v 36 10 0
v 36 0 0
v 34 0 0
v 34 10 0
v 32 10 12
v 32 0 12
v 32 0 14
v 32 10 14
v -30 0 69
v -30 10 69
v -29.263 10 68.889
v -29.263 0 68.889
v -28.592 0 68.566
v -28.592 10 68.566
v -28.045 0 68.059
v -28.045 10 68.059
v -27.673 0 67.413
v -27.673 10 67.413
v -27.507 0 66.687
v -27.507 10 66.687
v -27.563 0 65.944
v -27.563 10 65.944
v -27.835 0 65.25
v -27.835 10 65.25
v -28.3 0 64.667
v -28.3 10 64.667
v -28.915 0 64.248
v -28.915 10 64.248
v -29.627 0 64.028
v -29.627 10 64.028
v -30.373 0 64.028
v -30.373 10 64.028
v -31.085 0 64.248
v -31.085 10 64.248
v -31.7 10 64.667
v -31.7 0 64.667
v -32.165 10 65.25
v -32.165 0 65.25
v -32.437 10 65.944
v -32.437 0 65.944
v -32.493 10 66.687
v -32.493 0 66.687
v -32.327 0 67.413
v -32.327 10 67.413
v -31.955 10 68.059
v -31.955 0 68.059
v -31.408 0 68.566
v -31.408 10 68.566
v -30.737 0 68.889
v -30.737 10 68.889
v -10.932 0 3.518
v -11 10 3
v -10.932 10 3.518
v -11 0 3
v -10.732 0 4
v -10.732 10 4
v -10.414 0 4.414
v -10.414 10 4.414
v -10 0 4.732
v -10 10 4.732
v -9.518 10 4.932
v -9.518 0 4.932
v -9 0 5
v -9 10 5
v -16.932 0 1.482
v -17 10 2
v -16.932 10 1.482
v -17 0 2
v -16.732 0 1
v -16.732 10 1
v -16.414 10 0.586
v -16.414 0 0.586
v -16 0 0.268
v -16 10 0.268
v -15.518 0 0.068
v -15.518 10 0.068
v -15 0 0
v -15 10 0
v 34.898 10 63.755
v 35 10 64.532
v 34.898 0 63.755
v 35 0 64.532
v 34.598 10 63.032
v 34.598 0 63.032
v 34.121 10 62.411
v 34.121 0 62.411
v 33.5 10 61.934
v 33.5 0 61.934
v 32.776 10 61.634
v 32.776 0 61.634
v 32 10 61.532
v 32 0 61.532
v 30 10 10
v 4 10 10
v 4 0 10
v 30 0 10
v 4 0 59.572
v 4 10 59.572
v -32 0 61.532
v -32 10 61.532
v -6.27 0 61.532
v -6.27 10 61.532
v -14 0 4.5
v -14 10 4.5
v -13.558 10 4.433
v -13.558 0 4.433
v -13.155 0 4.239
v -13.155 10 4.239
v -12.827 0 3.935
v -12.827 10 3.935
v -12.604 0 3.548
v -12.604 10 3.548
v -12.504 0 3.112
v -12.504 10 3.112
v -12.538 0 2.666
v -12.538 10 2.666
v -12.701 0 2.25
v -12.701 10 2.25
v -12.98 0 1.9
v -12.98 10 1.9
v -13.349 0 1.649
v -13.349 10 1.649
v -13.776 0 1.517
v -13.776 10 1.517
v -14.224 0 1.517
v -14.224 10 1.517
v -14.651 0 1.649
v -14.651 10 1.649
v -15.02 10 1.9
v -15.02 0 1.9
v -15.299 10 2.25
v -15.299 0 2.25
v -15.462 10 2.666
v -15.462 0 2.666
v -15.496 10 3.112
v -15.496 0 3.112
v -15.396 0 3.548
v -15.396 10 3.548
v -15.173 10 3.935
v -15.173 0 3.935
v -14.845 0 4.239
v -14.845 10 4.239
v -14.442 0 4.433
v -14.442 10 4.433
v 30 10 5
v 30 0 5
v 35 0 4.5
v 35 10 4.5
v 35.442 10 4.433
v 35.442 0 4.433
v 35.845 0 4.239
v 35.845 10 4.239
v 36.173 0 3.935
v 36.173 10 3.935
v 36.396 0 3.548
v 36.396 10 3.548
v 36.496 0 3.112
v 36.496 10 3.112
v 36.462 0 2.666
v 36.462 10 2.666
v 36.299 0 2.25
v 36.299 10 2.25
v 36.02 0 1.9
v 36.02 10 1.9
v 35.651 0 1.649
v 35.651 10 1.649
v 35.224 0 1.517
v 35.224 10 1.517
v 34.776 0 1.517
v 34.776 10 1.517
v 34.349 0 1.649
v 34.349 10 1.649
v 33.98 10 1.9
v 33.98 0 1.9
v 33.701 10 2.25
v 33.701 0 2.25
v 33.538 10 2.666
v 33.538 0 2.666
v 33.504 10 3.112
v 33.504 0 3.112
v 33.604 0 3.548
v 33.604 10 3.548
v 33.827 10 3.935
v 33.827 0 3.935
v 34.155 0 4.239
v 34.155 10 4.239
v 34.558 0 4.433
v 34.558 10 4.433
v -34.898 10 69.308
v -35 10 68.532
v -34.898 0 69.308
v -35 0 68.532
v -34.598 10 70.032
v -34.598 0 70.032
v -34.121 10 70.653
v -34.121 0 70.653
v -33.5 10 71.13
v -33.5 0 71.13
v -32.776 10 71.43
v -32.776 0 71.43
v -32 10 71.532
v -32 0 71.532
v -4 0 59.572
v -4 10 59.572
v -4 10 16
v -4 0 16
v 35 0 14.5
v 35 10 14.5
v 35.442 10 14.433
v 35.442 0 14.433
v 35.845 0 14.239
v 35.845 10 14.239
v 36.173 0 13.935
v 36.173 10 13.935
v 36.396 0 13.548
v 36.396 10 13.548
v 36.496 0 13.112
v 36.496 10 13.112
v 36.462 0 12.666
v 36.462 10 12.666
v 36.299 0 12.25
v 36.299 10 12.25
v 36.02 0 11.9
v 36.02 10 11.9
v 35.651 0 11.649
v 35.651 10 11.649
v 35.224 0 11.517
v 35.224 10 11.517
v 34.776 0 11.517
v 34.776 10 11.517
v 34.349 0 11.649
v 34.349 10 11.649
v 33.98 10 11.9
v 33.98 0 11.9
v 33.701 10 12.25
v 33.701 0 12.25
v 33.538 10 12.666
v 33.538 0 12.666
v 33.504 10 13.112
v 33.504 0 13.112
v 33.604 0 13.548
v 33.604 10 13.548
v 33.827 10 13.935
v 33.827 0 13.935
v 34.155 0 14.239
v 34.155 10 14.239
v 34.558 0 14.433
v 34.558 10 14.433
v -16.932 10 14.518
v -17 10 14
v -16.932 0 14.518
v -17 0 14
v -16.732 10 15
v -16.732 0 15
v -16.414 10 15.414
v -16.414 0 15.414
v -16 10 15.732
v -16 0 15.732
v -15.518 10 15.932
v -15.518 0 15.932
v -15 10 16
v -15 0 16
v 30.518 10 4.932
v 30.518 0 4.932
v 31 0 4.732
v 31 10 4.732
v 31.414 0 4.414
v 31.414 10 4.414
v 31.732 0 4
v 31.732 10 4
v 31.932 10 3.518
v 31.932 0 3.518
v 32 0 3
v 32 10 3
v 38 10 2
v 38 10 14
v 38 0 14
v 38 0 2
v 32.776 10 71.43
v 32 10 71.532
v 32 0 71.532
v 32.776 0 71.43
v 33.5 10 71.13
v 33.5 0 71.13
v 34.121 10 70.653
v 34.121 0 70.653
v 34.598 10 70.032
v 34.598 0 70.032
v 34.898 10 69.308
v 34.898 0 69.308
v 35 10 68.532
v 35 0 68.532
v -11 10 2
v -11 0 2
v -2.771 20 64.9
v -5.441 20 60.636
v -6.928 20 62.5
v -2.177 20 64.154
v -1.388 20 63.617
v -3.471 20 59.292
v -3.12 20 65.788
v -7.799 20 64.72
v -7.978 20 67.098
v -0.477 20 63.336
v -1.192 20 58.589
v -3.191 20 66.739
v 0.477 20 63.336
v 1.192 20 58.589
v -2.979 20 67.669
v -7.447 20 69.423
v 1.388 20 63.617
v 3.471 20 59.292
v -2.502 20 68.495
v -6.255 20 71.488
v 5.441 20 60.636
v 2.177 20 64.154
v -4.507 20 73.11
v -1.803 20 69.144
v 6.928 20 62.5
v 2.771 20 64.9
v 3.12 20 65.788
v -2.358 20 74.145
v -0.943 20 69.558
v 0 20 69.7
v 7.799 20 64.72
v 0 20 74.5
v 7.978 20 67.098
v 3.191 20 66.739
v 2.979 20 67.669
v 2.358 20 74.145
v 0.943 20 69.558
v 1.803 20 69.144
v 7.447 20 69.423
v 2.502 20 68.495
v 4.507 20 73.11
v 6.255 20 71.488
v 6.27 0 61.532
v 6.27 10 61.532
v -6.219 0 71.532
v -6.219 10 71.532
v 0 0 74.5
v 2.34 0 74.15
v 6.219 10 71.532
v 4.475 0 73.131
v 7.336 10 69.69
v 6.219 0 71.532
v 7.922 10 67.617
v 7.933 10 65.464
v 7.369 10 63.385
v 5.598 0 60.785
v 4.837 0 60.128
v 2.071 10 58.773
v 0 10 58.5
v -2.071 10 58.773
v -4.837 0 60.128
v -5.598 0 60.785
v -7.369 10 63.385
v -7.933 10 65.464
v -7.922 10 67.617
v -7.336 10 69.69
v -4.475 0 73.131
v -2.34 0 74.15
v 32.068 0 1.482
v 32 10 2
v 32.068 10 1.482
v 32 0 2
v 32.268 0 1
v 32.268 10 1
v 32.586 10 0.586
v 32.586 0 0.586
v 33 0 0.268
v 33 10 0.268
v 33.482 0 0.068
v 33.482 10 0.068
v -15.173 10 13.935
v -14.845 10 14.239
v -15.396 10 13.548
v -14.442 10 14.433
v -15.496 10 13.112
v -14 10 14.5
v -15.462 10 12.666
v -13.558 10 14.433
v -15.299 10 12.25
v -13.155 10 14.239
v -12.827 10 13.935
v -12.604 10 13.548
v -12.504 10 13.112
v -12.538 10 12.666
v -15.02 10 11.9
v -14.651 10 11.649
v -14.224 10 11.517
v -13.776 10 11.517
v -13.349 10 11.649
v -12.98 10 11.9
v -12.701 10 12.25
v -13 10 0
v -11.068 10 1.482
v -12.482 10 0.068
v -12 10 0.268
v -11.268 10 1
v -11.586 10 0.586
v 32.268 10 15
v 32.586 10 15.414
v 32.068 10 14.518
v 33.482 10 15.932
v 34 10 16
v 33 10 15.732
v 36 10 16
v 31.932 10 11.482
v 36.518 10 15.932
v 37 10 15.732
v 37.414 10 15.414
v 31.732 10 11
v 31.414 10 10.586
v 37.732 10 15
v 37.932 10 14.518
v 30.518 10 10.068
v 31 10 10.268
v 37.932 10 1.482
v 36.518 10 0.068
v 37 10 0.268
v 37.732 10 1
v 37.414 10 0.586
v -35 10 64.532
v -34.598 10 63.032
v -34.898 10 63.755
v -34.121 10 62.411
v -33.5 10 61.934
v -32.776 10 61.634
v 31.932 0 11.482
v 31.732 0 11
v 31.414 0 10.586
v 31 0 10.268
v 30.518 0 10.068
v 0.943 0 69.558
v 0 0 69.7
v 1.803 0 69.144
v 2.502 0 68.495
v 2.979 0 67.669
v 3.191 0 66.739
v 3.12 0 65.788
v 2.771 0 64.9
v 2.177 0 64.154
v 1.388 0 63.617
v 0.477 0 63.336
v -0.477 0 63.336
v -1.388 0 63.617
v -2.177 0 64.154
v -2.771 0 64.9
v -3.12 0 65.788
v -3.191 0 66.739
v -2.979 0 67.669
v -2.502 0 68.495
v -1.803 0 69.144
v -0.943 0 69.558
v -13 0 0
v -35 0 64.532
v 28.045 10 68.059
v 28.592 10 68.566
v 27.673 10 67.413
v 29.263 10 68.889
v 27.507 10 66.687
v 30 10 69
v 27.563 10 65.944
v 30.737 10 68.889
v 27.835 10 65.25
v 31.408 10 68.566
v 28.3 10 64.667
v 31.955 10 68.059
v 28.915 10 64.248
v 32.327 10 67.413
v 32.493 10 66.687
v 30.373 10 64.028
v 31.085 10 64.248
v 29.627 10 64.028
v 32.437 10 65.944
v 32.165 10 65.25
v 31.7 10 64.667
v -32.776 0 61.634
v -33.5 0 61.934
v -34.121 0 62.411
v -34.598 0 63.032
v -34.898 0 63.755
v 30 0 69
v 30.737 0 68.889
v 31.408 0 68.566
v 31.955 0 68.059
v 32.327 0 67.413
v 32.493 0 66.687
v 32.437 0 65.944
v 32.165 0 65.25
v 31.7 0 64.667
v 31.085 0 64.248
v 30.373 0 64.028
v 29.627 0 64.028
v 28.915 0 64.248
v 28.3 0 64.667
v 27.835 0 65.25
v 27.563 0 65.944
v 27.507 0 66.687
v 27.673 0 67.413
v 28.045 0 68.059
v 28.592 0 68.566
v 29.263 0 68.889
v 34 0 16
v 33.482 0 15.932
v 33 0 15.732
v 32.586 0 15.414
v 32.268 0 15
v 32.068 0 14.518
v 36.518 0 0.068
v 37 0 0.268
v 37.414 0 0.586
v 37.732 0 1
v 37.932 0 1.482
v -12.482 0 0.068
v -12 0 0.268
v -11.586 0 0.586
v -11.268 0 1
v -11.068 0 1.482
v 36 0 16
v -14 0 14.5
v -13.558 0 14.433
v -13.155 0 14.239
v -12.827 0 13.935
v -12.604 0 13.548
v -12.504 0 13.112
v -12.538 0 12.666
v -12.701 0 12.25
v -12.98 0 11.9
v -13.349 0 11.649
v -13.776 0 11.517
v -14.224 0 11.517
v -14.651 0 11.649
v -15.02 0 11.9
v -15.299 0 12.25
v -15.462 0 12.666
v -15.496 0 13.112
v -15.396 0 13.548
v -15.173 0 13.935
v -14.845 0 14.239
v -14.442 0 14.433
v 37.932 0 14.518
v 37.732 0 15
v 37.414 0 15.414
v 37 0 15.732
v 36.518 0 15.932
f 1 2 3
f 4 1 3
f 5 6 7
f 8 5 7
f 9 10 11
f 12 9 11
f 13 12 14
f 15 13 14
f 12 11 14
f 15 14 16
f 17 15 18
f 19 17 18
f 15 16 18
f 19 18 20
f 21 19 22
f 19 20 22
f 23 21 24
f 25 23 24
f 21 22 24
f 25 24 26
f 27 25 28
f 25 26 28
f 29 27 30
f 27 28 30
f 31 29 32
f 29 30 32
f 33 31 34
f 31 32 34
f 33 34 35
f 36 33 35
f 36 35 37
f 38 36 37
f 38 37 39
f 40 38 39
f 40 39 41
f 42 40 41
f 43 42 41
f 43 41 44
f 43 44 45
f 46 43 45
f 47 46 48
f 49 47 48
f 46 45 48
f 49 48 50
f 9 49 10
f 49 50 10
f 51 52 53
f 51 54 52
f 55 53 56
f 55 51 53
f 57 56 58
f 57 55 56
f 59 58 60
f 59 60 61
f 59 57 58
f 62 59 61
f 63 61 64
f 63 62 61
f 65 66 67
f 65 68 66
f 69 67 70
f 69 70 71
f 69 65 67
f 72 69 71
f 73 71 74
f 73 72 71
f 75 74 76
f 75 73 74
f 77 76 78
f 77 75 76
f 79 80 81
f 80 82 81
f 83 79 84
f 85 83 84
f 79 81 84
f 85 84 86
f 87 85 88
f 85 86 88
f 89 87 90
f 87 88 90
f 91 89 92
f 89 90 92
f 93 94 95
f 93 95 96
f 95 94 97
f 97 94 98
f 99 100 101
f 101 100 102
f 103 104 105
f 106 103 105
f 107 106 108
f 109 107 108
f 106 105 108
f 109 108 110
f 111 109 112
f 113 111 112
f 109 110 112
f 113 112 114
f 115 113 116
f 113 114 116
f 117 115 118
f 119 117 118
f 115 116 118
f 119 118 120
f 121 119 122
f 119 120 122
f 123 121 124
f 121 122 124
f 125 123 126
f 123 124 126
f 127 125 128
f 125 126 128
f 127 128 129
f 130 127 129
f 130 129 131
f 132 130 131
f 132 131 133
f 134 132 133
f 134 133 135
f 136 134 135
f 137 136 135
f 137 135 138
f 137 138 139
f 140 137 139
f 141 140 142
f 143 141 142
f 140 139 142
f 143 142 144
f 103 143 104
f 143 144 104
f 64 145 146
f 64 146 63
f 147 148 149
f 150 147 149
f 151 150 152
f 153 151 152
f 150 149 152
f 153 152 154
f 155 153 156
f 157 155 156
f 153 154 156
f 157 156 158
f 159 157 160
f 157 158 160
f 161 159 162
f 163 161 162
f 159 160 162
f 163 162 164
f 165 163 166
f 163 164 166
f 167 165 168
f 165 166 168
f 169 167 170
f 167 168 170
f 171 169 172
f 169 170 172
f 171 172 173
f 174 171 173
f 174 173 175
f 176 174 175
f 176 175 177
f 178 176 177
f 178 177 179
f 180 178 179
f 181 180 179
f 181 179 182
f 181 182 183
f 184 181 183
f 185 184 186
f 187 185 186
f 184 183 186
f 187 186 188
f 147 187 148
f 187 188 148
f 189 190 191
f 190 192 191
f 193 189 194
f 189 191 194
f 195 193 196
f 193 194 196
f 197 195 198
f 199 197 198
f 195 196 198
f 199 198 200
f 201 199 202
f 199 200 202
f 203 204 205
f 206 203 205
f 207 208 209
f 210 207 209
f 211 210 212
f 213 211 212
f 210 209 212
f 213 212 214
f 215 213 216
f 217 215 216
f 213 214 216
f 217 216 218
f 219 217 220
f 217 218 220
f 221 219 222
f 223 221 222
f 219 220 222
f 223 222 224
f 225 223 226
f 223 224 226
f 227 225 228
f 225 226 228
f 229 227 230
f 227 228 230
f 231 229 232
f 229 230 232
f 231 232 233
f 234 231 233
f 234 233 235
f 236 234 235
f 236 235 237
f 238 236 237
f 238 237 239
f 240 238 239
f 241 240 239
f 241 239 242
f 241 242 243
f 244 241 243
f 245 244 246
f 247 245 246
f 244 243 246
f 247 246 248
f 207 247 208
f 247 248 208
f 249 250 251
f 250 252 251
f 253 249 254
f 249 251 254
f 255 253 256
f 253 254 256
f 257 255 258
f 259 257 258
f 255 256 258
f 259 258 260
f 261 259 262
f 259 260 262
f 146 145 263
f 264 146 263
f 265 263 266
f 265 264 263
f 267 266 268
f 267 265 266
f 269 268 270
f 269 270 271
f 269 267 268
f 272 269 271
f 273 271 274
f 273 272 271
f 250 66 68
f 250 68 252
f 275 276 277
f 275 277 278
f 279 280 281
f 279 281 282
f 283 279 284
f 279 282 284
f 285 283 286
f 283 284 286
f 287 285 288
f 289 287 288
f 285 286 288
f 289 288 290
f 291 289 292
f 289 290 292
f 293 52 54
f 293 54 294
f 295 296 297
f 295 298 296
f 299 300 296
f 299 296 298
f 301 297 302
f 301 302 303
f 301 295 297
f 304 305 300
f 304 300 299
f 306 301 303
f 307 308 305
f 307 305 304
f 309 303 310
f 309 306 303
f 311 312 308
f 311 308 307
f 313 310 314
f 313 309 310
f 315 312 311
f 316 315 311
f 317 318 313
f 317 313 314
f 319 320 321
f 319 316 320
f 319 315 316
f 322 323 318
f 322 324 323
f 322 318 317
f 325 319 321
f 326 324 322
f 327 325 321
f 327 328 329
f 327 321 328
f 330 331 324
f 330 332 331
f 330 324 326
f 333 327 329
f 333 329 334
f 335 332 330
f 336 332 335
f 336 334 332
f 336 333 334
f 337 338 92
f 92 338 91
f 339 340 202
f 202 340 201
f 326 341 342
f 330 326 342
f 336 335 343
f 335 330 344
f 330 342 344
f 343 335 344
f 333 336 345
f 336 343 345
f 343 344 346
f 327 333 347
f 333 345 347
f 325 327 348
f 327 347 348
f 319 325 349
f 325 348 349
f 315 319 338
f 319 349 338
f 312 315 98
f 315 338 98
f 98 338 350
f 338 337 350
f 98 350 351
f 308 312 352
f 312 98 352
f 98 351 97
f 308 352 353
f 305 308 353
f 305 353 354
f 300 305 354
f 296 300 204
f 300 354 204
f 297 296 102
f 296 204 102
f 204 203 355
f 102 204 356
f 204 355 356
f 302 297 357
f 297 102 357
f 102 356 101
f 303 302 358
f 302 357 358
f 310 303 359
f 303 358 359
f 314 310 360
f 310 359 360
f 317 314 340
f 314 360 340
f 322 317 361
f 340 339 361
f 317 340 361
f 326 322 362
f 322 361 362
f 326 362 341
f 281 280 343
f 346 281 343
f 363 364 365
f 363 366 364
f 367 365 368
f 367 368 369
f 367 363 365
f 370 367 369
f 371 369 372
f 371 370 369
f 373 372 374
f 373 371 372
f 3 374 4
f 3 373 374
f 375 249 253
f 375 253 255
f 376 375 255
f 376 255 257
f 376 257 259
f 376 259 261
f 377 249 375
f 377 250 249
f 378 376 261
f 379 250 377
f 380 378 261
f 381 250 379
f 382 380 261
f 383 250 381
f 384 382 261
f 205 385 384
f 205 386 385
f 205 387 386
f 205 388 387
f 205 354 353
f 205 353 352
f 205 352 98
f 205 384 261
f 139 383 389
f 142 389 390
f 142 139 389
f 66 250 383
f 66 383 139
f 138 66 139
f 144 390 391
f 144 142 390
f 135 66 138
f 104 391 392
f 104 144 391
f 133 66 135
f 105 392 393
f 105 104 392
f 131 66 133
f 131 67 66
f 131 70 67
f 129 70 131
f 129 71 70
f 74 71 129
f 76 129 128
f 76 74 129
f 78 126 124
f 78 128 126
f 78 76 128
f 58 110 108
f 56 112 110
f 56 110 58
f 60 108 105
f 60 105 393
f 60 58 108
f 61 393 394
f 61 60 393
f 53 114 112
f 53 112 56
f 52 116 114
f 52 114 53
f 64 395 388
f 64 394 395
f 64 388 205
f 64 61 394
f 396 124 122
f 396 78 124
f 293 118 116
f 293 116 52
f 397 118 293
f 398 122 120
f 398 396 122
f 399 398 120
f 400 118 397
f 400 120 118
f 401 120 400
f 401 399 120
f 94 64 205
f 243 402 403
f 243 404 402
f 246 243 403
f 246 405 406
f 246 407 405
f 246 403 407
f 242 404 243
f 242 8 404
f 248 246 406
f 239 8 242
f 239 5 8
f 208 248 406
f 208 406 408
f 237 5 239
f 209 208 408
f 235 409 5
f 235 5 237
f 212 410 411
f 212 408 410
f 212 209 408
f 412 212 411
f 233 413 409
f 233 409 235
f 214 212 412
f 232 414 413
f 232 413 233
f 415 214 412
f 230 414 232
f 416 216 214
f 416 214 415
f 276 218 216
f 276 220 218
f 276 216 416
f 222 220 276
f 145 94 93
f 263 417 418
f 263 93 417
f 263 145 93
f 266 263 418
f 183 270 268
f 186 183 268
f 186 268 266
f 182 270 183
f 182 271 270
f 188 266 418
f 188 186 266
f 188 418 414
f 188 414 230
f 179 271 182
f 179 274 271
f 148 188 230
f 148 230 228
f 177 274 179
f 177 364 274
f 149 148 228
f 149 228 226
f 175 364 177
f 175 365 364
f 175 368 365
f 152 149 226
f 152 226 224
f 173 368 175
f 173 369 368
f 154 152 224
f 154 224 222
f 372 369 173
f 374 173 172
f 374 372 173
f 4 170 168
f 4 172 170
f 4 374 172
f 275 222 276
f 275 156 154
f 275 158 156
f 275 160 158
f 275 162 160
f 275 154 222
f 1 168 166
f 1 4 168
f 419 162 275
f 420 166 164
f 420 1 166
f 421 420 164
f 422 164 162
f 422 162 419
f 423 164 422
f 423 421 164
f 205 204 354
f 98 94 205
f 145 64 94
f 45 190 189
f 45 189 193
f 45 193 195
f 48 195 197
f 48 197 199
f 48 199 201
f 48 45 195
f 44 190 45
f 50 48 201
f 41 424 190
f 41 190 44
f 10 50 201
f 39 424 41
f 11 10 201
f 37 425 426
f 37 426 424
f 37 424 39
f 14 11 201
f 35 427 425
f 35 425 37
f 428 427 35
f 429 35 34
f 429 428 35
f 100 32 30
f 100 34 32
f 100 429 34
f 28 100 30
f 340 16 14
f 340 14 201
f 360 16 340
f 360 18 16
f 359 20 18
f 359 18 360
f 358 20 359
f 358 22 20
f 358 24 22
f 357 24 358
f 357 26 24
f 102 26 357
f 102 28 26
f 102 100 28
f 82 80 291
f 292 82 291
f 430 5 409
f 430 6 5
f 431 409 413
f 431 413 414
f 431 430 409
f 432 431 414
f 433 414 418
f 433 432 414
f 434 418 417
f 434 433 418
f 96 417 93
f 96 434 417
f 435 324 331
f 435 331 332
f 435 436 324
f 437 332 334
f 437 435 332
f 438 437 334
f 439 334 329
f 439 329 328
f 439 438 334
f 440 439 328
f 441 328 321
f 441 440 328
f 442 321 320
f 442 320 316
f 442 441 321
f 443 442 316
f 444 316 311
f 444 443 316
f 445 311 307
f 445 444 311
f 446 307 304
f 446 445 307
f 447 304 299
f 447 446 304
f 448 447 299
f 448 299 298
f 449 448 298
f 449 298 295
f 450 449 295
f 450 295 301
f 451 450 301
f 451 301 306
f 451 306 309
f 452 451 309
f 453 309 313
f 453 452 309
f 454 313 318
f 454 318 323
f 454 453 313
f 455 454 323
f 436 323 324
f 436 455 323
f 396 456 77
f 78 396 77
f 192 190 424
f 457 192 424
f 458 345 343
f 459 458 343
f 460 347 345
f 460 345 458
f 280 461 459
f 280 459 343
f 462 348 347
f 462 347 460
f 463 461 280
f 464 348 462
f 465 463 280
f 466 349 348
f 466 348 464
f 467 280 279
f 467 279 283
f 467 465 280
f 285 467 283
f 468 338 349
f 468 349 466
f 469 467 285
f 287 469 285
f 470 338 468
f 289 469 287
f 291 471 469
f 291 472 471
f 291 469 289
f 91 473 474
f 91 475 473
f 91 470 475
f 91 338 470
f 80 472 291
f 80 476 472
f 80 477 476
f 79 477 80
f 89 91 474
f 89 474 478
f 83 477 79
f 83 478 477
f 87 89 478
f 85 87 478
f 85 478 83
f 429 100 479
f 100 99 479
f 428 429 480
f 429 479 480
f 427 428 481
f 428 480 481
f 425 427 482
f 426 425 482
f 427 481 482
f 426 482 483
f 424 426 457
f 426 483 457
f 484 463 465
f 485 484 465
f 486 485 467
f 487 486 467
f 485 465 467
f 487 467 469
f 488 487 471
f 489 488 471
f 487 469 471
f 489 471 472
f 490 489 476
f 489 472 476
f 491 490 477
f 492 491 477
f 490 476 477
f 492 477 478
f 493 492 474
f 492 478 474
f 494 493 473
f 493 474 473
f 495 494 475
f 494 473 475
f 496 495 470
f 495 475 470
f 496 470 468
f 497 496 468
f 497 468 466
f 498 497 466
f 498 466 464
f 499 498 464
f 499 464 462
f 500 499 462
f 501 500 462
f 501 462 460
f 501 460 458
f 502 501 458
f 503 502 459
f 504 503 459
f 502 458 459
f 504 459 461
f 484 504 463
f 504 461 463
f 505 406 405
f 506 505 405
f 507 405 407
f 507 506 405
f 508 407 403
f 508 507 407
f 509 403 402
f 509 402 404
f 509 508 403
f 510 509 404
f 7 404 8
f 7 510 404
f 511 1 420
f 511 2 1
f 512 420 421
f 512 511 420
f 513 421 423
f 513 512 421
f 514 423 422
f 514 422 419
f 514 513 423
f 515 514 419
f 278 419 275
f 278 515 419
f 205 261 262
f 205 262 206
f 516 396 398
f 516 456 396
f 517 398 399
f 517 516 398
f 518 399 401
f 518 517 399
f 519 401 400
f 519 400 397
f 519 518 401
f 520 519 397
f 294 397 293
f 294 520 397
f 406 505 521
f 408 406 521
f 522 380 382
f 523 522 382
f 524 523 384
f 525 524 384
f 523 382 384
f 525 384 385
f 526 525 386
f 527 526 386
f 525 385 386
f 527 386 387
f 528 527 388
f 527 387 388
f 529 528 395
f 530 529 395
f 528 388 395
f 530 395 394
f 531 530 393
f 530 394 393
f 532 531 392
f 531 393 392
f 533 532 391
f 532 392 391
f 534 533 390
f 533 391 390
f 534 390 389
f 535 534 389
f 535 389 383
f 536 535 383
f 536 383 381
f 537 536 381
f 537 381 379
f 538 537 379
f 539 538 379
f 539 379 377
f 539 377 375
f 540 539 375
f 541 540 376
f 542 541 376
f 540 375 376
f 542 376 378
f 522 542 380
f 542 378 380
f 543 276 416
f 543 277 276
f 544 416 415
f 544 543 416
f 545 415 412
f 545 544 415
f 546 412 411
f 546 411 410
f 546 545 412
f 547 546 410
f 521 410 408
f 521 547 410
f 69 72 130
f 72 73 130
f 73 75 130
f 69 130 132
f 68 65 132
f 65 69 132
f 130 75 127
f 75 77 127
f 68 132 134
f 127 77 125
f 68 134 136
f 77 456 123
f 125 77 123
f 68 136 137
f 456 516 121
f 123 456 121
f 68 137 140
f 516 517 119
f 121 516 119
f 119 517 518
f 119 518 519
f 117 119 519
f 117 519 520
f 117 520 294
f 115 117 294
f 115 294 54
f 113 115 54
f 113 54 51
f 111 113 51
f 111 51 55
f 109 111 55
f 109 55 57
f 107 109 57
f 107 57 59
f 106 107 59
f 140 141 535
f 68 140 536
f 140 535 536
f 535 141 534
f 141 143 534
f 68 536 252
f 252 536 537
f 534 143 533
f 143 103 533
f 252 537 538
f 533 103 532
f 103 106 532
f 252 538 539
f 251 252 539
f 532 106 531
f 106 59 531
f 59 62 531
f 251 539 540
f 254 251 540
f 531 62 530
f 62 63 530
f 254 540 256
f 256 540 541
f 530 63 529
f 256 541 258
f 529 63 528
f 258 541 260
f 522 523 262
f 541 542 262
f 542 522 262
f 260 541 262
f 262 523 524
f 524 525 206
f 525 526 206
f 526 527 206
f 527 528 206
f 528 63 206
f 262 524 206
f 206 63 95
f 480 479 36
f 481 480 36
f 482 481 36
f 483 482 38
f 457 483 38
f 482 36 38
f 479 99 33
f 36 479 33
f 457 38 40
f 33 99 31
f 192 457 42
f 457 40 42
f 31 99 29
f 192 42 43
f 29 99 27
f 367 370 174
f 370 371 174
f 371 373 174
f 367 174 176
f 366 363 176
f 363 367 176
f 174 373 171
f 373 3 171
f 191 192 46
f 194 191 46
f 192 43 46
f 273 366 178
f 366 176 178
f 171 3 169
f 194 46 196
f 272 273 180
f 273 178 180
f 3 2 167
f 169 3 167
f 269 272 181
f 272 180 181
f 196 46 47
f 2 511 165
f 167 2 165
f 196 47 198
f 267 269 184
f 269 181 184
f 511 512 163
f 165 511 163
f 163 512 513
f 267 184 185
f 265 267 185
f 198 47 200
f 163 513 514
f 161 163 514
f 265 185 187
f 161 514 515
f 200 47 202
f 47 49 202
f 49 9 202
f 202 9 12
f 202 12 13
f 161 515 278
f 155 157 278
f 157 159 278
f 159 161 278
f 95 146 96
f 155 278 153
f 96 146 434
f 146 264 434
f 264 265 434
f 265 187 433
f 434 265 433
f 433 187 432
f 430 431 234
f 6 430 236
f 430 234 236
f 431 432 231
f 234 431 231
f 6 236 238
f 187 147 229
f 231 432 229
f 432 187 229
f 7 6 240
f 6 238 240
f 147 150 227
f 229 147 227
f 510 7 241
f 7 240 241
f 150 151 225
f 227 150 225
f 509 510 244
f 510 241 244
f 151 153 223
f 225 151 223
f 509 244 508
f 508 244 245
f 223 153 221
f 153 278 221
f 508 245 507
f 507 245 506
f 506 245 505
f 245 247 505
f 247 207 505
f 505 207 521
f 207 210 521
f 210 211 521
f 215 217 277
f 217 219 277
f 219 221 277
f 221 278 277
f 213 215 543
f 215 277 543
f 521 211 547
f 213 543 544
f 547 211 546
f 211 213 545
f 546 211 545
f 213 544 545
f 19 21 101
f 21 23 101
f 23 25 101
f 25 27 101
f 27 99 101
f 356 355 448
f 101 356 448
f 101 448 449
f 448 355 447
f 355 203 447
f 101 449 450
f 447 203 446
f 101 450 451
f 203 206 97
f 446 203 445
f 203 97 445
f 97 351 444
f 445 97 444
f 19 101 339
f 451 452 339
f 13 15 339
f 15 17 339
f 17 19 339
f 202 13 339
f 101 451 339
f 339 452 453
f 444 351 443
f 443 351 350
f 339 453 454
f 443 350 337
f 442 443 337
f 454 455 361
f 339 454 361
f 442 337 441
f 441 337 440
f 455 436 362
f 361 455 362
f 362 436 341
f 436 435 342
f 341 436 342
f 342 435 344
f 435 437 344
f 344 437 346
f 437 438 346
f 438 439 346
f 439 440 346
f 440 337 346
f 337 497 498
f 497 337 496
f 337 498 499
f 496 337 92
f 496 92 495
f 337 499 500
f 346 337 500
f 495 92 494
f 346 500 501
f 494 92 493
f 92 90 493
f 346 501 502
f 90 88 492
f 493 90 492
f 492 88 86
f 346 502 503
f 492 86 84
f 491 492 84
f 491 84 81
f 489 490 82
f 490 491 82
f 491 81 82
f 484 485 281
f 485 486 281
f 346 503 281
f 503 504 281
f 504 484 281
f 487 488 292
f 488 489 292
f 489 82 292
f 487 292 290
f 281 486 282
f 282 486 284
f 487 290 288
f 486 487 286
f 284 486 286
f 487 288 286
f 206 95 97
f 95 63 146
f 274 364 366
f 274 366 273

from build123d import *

# Parameters (mm, degrees)
SKETCH_2_W           = 8
SKETCH_2_H           = 17
EXTRUDE_1_DEPTH      = 10
SKETCH_4_R           = 3.2
SKETCH_4_R_2         = 2.5
EXTRUDE_2_DEPTH      = 10
SKETCH_6_R           = 1.5
EXTRUDE_3_DEPTH      = 10
FILLET_6_R           = 2
FILLET_7_R           = 3
EXTRUDE_4_DEPTH      = 10
EXTRUDE_4_DEPTH_BACK = 10
SKETCH_7_R           = 8
SKETCH_7_R_2         = 3.2


with BuildPart() as part:
    # 草图2 → 凸台-拉伸1 (new body)
    with BuildSketch(Plane(origin=(0, 0, 0), x_dir=(1, 0, 0), z_dir=(0, 1, 0))):
        with Locations((0, -14.5)):
            Rectangle(SKETCH_2_W, SKETCH_2_H)
    extrude(amount=EXTRUDE_1_DEPTH)

    # 草图4 → 凸台-拉伸2 (add)
    with BuildSketch(Plane(origin=(0, 10, 0), x_dir=(1, 0, 0), z_dir=(0, 1, 0))):
        Polygon((-4, -23), (4, -23), (4, -61.531911565), (35, -61.531911565), (35, -71.531911565), (-35, -71.531911565), (-35, -61.531911565), (-4, -61.531911565), align=None)
        with Locations((0, -66.5)):
            Circle(SKETCH_4_R, mode=Mode.SUBTRACT)
        with Locations((30, -66.5)):
            Circle(SKETCH_4_R_2, mode=Mode.SUBTRACT)
        with Locations((-30, -66.5)):
            Circle(SKETCH_4_R_2, mode=Mode.SUBTRACT)
    extrude(amount=-EXTRUDE_2_DEPTH)

    # 草图6 → 凸台-拉伸3 (add)
    with BuildSketch(Plane(origin=(0, 10, 0), x_dir=(1, 0, 0), z_dir=(0, 1, 0))):
        Polygon((-17, 0), (-17, -16), (-4, -16), (-4, -10), (32, -10), (32, -16), (38, -16), (38, 0), (32, 0), (32, -5), (-11, -5), (-11, 0), align=None)
        with Locations((-14, -3)):
            Circle(SKETCH_6_R, mode=Mode.SUBTRACT)
        with Locations((-14, -13)):
            Circle(SKETCH_6_R, mode=Mode.SUBTRACT)
        with Locations((35, -3)):
            Circle(SKETCH_6_R, mode=Mode.SUBTRACT)
        with Locations((35, -13)):
            Circle(SKETCH_6_R, mode=Mode.SUBTRACT)
    extrude(amount=-EXTRUDE_3_DEPTH)

    # 圆角6
    fillet_6_edges = [part.edges().sort_by_distance(p)[0] for p in [
        (-11, 5, 5),
        (32, 5, 5),
        (32, 5, 0),
        (38, 5, 0),
        (38, 5, 16),
        (32, 5, 16),
        (32, 5, 10),
        (-11, 5, 0),
        (-17, 5, 16),
        (-17, 5, 0),
    ]]
    fillet(fillet_6_edges, radius=FILLET_6_R)

    # 圆角7
    fillet_7_edges = [part.edges().sort_by_distance(p)[0] for p in [
        (35, 5, 71.531911565),
        (35, 5, 61.531911565),
        (-35, 5, 71.531911565),
        (-35, 5, 61.531911565),
    ]]
    fillet(fillet_7_edges, radius=FILLET_7_R)

    # 草图7 → 凸台-拉伸4 (add, two sides: drawn at the far end of the back side and taken through both)
    with BuildSketch(Plane(origin=(0, 10, 0), x_dir=(1, 0, 0), z_dir=(0, 1, 0)).offset(-EXTRUDE_4_DEPTH_BACK)):
        with Locations((0, -66.5)):
            Circle(SKETCH_7_R)
        with Locations((0, -66.5)):
            Circle(SKETCH_7_R_2, mode=Mode.SUBTRACT)
    extrude(amount=EXTRUDE_4_DEPTH + EXTRUDE_4_DEPTH_BACK)


solid = part.part
